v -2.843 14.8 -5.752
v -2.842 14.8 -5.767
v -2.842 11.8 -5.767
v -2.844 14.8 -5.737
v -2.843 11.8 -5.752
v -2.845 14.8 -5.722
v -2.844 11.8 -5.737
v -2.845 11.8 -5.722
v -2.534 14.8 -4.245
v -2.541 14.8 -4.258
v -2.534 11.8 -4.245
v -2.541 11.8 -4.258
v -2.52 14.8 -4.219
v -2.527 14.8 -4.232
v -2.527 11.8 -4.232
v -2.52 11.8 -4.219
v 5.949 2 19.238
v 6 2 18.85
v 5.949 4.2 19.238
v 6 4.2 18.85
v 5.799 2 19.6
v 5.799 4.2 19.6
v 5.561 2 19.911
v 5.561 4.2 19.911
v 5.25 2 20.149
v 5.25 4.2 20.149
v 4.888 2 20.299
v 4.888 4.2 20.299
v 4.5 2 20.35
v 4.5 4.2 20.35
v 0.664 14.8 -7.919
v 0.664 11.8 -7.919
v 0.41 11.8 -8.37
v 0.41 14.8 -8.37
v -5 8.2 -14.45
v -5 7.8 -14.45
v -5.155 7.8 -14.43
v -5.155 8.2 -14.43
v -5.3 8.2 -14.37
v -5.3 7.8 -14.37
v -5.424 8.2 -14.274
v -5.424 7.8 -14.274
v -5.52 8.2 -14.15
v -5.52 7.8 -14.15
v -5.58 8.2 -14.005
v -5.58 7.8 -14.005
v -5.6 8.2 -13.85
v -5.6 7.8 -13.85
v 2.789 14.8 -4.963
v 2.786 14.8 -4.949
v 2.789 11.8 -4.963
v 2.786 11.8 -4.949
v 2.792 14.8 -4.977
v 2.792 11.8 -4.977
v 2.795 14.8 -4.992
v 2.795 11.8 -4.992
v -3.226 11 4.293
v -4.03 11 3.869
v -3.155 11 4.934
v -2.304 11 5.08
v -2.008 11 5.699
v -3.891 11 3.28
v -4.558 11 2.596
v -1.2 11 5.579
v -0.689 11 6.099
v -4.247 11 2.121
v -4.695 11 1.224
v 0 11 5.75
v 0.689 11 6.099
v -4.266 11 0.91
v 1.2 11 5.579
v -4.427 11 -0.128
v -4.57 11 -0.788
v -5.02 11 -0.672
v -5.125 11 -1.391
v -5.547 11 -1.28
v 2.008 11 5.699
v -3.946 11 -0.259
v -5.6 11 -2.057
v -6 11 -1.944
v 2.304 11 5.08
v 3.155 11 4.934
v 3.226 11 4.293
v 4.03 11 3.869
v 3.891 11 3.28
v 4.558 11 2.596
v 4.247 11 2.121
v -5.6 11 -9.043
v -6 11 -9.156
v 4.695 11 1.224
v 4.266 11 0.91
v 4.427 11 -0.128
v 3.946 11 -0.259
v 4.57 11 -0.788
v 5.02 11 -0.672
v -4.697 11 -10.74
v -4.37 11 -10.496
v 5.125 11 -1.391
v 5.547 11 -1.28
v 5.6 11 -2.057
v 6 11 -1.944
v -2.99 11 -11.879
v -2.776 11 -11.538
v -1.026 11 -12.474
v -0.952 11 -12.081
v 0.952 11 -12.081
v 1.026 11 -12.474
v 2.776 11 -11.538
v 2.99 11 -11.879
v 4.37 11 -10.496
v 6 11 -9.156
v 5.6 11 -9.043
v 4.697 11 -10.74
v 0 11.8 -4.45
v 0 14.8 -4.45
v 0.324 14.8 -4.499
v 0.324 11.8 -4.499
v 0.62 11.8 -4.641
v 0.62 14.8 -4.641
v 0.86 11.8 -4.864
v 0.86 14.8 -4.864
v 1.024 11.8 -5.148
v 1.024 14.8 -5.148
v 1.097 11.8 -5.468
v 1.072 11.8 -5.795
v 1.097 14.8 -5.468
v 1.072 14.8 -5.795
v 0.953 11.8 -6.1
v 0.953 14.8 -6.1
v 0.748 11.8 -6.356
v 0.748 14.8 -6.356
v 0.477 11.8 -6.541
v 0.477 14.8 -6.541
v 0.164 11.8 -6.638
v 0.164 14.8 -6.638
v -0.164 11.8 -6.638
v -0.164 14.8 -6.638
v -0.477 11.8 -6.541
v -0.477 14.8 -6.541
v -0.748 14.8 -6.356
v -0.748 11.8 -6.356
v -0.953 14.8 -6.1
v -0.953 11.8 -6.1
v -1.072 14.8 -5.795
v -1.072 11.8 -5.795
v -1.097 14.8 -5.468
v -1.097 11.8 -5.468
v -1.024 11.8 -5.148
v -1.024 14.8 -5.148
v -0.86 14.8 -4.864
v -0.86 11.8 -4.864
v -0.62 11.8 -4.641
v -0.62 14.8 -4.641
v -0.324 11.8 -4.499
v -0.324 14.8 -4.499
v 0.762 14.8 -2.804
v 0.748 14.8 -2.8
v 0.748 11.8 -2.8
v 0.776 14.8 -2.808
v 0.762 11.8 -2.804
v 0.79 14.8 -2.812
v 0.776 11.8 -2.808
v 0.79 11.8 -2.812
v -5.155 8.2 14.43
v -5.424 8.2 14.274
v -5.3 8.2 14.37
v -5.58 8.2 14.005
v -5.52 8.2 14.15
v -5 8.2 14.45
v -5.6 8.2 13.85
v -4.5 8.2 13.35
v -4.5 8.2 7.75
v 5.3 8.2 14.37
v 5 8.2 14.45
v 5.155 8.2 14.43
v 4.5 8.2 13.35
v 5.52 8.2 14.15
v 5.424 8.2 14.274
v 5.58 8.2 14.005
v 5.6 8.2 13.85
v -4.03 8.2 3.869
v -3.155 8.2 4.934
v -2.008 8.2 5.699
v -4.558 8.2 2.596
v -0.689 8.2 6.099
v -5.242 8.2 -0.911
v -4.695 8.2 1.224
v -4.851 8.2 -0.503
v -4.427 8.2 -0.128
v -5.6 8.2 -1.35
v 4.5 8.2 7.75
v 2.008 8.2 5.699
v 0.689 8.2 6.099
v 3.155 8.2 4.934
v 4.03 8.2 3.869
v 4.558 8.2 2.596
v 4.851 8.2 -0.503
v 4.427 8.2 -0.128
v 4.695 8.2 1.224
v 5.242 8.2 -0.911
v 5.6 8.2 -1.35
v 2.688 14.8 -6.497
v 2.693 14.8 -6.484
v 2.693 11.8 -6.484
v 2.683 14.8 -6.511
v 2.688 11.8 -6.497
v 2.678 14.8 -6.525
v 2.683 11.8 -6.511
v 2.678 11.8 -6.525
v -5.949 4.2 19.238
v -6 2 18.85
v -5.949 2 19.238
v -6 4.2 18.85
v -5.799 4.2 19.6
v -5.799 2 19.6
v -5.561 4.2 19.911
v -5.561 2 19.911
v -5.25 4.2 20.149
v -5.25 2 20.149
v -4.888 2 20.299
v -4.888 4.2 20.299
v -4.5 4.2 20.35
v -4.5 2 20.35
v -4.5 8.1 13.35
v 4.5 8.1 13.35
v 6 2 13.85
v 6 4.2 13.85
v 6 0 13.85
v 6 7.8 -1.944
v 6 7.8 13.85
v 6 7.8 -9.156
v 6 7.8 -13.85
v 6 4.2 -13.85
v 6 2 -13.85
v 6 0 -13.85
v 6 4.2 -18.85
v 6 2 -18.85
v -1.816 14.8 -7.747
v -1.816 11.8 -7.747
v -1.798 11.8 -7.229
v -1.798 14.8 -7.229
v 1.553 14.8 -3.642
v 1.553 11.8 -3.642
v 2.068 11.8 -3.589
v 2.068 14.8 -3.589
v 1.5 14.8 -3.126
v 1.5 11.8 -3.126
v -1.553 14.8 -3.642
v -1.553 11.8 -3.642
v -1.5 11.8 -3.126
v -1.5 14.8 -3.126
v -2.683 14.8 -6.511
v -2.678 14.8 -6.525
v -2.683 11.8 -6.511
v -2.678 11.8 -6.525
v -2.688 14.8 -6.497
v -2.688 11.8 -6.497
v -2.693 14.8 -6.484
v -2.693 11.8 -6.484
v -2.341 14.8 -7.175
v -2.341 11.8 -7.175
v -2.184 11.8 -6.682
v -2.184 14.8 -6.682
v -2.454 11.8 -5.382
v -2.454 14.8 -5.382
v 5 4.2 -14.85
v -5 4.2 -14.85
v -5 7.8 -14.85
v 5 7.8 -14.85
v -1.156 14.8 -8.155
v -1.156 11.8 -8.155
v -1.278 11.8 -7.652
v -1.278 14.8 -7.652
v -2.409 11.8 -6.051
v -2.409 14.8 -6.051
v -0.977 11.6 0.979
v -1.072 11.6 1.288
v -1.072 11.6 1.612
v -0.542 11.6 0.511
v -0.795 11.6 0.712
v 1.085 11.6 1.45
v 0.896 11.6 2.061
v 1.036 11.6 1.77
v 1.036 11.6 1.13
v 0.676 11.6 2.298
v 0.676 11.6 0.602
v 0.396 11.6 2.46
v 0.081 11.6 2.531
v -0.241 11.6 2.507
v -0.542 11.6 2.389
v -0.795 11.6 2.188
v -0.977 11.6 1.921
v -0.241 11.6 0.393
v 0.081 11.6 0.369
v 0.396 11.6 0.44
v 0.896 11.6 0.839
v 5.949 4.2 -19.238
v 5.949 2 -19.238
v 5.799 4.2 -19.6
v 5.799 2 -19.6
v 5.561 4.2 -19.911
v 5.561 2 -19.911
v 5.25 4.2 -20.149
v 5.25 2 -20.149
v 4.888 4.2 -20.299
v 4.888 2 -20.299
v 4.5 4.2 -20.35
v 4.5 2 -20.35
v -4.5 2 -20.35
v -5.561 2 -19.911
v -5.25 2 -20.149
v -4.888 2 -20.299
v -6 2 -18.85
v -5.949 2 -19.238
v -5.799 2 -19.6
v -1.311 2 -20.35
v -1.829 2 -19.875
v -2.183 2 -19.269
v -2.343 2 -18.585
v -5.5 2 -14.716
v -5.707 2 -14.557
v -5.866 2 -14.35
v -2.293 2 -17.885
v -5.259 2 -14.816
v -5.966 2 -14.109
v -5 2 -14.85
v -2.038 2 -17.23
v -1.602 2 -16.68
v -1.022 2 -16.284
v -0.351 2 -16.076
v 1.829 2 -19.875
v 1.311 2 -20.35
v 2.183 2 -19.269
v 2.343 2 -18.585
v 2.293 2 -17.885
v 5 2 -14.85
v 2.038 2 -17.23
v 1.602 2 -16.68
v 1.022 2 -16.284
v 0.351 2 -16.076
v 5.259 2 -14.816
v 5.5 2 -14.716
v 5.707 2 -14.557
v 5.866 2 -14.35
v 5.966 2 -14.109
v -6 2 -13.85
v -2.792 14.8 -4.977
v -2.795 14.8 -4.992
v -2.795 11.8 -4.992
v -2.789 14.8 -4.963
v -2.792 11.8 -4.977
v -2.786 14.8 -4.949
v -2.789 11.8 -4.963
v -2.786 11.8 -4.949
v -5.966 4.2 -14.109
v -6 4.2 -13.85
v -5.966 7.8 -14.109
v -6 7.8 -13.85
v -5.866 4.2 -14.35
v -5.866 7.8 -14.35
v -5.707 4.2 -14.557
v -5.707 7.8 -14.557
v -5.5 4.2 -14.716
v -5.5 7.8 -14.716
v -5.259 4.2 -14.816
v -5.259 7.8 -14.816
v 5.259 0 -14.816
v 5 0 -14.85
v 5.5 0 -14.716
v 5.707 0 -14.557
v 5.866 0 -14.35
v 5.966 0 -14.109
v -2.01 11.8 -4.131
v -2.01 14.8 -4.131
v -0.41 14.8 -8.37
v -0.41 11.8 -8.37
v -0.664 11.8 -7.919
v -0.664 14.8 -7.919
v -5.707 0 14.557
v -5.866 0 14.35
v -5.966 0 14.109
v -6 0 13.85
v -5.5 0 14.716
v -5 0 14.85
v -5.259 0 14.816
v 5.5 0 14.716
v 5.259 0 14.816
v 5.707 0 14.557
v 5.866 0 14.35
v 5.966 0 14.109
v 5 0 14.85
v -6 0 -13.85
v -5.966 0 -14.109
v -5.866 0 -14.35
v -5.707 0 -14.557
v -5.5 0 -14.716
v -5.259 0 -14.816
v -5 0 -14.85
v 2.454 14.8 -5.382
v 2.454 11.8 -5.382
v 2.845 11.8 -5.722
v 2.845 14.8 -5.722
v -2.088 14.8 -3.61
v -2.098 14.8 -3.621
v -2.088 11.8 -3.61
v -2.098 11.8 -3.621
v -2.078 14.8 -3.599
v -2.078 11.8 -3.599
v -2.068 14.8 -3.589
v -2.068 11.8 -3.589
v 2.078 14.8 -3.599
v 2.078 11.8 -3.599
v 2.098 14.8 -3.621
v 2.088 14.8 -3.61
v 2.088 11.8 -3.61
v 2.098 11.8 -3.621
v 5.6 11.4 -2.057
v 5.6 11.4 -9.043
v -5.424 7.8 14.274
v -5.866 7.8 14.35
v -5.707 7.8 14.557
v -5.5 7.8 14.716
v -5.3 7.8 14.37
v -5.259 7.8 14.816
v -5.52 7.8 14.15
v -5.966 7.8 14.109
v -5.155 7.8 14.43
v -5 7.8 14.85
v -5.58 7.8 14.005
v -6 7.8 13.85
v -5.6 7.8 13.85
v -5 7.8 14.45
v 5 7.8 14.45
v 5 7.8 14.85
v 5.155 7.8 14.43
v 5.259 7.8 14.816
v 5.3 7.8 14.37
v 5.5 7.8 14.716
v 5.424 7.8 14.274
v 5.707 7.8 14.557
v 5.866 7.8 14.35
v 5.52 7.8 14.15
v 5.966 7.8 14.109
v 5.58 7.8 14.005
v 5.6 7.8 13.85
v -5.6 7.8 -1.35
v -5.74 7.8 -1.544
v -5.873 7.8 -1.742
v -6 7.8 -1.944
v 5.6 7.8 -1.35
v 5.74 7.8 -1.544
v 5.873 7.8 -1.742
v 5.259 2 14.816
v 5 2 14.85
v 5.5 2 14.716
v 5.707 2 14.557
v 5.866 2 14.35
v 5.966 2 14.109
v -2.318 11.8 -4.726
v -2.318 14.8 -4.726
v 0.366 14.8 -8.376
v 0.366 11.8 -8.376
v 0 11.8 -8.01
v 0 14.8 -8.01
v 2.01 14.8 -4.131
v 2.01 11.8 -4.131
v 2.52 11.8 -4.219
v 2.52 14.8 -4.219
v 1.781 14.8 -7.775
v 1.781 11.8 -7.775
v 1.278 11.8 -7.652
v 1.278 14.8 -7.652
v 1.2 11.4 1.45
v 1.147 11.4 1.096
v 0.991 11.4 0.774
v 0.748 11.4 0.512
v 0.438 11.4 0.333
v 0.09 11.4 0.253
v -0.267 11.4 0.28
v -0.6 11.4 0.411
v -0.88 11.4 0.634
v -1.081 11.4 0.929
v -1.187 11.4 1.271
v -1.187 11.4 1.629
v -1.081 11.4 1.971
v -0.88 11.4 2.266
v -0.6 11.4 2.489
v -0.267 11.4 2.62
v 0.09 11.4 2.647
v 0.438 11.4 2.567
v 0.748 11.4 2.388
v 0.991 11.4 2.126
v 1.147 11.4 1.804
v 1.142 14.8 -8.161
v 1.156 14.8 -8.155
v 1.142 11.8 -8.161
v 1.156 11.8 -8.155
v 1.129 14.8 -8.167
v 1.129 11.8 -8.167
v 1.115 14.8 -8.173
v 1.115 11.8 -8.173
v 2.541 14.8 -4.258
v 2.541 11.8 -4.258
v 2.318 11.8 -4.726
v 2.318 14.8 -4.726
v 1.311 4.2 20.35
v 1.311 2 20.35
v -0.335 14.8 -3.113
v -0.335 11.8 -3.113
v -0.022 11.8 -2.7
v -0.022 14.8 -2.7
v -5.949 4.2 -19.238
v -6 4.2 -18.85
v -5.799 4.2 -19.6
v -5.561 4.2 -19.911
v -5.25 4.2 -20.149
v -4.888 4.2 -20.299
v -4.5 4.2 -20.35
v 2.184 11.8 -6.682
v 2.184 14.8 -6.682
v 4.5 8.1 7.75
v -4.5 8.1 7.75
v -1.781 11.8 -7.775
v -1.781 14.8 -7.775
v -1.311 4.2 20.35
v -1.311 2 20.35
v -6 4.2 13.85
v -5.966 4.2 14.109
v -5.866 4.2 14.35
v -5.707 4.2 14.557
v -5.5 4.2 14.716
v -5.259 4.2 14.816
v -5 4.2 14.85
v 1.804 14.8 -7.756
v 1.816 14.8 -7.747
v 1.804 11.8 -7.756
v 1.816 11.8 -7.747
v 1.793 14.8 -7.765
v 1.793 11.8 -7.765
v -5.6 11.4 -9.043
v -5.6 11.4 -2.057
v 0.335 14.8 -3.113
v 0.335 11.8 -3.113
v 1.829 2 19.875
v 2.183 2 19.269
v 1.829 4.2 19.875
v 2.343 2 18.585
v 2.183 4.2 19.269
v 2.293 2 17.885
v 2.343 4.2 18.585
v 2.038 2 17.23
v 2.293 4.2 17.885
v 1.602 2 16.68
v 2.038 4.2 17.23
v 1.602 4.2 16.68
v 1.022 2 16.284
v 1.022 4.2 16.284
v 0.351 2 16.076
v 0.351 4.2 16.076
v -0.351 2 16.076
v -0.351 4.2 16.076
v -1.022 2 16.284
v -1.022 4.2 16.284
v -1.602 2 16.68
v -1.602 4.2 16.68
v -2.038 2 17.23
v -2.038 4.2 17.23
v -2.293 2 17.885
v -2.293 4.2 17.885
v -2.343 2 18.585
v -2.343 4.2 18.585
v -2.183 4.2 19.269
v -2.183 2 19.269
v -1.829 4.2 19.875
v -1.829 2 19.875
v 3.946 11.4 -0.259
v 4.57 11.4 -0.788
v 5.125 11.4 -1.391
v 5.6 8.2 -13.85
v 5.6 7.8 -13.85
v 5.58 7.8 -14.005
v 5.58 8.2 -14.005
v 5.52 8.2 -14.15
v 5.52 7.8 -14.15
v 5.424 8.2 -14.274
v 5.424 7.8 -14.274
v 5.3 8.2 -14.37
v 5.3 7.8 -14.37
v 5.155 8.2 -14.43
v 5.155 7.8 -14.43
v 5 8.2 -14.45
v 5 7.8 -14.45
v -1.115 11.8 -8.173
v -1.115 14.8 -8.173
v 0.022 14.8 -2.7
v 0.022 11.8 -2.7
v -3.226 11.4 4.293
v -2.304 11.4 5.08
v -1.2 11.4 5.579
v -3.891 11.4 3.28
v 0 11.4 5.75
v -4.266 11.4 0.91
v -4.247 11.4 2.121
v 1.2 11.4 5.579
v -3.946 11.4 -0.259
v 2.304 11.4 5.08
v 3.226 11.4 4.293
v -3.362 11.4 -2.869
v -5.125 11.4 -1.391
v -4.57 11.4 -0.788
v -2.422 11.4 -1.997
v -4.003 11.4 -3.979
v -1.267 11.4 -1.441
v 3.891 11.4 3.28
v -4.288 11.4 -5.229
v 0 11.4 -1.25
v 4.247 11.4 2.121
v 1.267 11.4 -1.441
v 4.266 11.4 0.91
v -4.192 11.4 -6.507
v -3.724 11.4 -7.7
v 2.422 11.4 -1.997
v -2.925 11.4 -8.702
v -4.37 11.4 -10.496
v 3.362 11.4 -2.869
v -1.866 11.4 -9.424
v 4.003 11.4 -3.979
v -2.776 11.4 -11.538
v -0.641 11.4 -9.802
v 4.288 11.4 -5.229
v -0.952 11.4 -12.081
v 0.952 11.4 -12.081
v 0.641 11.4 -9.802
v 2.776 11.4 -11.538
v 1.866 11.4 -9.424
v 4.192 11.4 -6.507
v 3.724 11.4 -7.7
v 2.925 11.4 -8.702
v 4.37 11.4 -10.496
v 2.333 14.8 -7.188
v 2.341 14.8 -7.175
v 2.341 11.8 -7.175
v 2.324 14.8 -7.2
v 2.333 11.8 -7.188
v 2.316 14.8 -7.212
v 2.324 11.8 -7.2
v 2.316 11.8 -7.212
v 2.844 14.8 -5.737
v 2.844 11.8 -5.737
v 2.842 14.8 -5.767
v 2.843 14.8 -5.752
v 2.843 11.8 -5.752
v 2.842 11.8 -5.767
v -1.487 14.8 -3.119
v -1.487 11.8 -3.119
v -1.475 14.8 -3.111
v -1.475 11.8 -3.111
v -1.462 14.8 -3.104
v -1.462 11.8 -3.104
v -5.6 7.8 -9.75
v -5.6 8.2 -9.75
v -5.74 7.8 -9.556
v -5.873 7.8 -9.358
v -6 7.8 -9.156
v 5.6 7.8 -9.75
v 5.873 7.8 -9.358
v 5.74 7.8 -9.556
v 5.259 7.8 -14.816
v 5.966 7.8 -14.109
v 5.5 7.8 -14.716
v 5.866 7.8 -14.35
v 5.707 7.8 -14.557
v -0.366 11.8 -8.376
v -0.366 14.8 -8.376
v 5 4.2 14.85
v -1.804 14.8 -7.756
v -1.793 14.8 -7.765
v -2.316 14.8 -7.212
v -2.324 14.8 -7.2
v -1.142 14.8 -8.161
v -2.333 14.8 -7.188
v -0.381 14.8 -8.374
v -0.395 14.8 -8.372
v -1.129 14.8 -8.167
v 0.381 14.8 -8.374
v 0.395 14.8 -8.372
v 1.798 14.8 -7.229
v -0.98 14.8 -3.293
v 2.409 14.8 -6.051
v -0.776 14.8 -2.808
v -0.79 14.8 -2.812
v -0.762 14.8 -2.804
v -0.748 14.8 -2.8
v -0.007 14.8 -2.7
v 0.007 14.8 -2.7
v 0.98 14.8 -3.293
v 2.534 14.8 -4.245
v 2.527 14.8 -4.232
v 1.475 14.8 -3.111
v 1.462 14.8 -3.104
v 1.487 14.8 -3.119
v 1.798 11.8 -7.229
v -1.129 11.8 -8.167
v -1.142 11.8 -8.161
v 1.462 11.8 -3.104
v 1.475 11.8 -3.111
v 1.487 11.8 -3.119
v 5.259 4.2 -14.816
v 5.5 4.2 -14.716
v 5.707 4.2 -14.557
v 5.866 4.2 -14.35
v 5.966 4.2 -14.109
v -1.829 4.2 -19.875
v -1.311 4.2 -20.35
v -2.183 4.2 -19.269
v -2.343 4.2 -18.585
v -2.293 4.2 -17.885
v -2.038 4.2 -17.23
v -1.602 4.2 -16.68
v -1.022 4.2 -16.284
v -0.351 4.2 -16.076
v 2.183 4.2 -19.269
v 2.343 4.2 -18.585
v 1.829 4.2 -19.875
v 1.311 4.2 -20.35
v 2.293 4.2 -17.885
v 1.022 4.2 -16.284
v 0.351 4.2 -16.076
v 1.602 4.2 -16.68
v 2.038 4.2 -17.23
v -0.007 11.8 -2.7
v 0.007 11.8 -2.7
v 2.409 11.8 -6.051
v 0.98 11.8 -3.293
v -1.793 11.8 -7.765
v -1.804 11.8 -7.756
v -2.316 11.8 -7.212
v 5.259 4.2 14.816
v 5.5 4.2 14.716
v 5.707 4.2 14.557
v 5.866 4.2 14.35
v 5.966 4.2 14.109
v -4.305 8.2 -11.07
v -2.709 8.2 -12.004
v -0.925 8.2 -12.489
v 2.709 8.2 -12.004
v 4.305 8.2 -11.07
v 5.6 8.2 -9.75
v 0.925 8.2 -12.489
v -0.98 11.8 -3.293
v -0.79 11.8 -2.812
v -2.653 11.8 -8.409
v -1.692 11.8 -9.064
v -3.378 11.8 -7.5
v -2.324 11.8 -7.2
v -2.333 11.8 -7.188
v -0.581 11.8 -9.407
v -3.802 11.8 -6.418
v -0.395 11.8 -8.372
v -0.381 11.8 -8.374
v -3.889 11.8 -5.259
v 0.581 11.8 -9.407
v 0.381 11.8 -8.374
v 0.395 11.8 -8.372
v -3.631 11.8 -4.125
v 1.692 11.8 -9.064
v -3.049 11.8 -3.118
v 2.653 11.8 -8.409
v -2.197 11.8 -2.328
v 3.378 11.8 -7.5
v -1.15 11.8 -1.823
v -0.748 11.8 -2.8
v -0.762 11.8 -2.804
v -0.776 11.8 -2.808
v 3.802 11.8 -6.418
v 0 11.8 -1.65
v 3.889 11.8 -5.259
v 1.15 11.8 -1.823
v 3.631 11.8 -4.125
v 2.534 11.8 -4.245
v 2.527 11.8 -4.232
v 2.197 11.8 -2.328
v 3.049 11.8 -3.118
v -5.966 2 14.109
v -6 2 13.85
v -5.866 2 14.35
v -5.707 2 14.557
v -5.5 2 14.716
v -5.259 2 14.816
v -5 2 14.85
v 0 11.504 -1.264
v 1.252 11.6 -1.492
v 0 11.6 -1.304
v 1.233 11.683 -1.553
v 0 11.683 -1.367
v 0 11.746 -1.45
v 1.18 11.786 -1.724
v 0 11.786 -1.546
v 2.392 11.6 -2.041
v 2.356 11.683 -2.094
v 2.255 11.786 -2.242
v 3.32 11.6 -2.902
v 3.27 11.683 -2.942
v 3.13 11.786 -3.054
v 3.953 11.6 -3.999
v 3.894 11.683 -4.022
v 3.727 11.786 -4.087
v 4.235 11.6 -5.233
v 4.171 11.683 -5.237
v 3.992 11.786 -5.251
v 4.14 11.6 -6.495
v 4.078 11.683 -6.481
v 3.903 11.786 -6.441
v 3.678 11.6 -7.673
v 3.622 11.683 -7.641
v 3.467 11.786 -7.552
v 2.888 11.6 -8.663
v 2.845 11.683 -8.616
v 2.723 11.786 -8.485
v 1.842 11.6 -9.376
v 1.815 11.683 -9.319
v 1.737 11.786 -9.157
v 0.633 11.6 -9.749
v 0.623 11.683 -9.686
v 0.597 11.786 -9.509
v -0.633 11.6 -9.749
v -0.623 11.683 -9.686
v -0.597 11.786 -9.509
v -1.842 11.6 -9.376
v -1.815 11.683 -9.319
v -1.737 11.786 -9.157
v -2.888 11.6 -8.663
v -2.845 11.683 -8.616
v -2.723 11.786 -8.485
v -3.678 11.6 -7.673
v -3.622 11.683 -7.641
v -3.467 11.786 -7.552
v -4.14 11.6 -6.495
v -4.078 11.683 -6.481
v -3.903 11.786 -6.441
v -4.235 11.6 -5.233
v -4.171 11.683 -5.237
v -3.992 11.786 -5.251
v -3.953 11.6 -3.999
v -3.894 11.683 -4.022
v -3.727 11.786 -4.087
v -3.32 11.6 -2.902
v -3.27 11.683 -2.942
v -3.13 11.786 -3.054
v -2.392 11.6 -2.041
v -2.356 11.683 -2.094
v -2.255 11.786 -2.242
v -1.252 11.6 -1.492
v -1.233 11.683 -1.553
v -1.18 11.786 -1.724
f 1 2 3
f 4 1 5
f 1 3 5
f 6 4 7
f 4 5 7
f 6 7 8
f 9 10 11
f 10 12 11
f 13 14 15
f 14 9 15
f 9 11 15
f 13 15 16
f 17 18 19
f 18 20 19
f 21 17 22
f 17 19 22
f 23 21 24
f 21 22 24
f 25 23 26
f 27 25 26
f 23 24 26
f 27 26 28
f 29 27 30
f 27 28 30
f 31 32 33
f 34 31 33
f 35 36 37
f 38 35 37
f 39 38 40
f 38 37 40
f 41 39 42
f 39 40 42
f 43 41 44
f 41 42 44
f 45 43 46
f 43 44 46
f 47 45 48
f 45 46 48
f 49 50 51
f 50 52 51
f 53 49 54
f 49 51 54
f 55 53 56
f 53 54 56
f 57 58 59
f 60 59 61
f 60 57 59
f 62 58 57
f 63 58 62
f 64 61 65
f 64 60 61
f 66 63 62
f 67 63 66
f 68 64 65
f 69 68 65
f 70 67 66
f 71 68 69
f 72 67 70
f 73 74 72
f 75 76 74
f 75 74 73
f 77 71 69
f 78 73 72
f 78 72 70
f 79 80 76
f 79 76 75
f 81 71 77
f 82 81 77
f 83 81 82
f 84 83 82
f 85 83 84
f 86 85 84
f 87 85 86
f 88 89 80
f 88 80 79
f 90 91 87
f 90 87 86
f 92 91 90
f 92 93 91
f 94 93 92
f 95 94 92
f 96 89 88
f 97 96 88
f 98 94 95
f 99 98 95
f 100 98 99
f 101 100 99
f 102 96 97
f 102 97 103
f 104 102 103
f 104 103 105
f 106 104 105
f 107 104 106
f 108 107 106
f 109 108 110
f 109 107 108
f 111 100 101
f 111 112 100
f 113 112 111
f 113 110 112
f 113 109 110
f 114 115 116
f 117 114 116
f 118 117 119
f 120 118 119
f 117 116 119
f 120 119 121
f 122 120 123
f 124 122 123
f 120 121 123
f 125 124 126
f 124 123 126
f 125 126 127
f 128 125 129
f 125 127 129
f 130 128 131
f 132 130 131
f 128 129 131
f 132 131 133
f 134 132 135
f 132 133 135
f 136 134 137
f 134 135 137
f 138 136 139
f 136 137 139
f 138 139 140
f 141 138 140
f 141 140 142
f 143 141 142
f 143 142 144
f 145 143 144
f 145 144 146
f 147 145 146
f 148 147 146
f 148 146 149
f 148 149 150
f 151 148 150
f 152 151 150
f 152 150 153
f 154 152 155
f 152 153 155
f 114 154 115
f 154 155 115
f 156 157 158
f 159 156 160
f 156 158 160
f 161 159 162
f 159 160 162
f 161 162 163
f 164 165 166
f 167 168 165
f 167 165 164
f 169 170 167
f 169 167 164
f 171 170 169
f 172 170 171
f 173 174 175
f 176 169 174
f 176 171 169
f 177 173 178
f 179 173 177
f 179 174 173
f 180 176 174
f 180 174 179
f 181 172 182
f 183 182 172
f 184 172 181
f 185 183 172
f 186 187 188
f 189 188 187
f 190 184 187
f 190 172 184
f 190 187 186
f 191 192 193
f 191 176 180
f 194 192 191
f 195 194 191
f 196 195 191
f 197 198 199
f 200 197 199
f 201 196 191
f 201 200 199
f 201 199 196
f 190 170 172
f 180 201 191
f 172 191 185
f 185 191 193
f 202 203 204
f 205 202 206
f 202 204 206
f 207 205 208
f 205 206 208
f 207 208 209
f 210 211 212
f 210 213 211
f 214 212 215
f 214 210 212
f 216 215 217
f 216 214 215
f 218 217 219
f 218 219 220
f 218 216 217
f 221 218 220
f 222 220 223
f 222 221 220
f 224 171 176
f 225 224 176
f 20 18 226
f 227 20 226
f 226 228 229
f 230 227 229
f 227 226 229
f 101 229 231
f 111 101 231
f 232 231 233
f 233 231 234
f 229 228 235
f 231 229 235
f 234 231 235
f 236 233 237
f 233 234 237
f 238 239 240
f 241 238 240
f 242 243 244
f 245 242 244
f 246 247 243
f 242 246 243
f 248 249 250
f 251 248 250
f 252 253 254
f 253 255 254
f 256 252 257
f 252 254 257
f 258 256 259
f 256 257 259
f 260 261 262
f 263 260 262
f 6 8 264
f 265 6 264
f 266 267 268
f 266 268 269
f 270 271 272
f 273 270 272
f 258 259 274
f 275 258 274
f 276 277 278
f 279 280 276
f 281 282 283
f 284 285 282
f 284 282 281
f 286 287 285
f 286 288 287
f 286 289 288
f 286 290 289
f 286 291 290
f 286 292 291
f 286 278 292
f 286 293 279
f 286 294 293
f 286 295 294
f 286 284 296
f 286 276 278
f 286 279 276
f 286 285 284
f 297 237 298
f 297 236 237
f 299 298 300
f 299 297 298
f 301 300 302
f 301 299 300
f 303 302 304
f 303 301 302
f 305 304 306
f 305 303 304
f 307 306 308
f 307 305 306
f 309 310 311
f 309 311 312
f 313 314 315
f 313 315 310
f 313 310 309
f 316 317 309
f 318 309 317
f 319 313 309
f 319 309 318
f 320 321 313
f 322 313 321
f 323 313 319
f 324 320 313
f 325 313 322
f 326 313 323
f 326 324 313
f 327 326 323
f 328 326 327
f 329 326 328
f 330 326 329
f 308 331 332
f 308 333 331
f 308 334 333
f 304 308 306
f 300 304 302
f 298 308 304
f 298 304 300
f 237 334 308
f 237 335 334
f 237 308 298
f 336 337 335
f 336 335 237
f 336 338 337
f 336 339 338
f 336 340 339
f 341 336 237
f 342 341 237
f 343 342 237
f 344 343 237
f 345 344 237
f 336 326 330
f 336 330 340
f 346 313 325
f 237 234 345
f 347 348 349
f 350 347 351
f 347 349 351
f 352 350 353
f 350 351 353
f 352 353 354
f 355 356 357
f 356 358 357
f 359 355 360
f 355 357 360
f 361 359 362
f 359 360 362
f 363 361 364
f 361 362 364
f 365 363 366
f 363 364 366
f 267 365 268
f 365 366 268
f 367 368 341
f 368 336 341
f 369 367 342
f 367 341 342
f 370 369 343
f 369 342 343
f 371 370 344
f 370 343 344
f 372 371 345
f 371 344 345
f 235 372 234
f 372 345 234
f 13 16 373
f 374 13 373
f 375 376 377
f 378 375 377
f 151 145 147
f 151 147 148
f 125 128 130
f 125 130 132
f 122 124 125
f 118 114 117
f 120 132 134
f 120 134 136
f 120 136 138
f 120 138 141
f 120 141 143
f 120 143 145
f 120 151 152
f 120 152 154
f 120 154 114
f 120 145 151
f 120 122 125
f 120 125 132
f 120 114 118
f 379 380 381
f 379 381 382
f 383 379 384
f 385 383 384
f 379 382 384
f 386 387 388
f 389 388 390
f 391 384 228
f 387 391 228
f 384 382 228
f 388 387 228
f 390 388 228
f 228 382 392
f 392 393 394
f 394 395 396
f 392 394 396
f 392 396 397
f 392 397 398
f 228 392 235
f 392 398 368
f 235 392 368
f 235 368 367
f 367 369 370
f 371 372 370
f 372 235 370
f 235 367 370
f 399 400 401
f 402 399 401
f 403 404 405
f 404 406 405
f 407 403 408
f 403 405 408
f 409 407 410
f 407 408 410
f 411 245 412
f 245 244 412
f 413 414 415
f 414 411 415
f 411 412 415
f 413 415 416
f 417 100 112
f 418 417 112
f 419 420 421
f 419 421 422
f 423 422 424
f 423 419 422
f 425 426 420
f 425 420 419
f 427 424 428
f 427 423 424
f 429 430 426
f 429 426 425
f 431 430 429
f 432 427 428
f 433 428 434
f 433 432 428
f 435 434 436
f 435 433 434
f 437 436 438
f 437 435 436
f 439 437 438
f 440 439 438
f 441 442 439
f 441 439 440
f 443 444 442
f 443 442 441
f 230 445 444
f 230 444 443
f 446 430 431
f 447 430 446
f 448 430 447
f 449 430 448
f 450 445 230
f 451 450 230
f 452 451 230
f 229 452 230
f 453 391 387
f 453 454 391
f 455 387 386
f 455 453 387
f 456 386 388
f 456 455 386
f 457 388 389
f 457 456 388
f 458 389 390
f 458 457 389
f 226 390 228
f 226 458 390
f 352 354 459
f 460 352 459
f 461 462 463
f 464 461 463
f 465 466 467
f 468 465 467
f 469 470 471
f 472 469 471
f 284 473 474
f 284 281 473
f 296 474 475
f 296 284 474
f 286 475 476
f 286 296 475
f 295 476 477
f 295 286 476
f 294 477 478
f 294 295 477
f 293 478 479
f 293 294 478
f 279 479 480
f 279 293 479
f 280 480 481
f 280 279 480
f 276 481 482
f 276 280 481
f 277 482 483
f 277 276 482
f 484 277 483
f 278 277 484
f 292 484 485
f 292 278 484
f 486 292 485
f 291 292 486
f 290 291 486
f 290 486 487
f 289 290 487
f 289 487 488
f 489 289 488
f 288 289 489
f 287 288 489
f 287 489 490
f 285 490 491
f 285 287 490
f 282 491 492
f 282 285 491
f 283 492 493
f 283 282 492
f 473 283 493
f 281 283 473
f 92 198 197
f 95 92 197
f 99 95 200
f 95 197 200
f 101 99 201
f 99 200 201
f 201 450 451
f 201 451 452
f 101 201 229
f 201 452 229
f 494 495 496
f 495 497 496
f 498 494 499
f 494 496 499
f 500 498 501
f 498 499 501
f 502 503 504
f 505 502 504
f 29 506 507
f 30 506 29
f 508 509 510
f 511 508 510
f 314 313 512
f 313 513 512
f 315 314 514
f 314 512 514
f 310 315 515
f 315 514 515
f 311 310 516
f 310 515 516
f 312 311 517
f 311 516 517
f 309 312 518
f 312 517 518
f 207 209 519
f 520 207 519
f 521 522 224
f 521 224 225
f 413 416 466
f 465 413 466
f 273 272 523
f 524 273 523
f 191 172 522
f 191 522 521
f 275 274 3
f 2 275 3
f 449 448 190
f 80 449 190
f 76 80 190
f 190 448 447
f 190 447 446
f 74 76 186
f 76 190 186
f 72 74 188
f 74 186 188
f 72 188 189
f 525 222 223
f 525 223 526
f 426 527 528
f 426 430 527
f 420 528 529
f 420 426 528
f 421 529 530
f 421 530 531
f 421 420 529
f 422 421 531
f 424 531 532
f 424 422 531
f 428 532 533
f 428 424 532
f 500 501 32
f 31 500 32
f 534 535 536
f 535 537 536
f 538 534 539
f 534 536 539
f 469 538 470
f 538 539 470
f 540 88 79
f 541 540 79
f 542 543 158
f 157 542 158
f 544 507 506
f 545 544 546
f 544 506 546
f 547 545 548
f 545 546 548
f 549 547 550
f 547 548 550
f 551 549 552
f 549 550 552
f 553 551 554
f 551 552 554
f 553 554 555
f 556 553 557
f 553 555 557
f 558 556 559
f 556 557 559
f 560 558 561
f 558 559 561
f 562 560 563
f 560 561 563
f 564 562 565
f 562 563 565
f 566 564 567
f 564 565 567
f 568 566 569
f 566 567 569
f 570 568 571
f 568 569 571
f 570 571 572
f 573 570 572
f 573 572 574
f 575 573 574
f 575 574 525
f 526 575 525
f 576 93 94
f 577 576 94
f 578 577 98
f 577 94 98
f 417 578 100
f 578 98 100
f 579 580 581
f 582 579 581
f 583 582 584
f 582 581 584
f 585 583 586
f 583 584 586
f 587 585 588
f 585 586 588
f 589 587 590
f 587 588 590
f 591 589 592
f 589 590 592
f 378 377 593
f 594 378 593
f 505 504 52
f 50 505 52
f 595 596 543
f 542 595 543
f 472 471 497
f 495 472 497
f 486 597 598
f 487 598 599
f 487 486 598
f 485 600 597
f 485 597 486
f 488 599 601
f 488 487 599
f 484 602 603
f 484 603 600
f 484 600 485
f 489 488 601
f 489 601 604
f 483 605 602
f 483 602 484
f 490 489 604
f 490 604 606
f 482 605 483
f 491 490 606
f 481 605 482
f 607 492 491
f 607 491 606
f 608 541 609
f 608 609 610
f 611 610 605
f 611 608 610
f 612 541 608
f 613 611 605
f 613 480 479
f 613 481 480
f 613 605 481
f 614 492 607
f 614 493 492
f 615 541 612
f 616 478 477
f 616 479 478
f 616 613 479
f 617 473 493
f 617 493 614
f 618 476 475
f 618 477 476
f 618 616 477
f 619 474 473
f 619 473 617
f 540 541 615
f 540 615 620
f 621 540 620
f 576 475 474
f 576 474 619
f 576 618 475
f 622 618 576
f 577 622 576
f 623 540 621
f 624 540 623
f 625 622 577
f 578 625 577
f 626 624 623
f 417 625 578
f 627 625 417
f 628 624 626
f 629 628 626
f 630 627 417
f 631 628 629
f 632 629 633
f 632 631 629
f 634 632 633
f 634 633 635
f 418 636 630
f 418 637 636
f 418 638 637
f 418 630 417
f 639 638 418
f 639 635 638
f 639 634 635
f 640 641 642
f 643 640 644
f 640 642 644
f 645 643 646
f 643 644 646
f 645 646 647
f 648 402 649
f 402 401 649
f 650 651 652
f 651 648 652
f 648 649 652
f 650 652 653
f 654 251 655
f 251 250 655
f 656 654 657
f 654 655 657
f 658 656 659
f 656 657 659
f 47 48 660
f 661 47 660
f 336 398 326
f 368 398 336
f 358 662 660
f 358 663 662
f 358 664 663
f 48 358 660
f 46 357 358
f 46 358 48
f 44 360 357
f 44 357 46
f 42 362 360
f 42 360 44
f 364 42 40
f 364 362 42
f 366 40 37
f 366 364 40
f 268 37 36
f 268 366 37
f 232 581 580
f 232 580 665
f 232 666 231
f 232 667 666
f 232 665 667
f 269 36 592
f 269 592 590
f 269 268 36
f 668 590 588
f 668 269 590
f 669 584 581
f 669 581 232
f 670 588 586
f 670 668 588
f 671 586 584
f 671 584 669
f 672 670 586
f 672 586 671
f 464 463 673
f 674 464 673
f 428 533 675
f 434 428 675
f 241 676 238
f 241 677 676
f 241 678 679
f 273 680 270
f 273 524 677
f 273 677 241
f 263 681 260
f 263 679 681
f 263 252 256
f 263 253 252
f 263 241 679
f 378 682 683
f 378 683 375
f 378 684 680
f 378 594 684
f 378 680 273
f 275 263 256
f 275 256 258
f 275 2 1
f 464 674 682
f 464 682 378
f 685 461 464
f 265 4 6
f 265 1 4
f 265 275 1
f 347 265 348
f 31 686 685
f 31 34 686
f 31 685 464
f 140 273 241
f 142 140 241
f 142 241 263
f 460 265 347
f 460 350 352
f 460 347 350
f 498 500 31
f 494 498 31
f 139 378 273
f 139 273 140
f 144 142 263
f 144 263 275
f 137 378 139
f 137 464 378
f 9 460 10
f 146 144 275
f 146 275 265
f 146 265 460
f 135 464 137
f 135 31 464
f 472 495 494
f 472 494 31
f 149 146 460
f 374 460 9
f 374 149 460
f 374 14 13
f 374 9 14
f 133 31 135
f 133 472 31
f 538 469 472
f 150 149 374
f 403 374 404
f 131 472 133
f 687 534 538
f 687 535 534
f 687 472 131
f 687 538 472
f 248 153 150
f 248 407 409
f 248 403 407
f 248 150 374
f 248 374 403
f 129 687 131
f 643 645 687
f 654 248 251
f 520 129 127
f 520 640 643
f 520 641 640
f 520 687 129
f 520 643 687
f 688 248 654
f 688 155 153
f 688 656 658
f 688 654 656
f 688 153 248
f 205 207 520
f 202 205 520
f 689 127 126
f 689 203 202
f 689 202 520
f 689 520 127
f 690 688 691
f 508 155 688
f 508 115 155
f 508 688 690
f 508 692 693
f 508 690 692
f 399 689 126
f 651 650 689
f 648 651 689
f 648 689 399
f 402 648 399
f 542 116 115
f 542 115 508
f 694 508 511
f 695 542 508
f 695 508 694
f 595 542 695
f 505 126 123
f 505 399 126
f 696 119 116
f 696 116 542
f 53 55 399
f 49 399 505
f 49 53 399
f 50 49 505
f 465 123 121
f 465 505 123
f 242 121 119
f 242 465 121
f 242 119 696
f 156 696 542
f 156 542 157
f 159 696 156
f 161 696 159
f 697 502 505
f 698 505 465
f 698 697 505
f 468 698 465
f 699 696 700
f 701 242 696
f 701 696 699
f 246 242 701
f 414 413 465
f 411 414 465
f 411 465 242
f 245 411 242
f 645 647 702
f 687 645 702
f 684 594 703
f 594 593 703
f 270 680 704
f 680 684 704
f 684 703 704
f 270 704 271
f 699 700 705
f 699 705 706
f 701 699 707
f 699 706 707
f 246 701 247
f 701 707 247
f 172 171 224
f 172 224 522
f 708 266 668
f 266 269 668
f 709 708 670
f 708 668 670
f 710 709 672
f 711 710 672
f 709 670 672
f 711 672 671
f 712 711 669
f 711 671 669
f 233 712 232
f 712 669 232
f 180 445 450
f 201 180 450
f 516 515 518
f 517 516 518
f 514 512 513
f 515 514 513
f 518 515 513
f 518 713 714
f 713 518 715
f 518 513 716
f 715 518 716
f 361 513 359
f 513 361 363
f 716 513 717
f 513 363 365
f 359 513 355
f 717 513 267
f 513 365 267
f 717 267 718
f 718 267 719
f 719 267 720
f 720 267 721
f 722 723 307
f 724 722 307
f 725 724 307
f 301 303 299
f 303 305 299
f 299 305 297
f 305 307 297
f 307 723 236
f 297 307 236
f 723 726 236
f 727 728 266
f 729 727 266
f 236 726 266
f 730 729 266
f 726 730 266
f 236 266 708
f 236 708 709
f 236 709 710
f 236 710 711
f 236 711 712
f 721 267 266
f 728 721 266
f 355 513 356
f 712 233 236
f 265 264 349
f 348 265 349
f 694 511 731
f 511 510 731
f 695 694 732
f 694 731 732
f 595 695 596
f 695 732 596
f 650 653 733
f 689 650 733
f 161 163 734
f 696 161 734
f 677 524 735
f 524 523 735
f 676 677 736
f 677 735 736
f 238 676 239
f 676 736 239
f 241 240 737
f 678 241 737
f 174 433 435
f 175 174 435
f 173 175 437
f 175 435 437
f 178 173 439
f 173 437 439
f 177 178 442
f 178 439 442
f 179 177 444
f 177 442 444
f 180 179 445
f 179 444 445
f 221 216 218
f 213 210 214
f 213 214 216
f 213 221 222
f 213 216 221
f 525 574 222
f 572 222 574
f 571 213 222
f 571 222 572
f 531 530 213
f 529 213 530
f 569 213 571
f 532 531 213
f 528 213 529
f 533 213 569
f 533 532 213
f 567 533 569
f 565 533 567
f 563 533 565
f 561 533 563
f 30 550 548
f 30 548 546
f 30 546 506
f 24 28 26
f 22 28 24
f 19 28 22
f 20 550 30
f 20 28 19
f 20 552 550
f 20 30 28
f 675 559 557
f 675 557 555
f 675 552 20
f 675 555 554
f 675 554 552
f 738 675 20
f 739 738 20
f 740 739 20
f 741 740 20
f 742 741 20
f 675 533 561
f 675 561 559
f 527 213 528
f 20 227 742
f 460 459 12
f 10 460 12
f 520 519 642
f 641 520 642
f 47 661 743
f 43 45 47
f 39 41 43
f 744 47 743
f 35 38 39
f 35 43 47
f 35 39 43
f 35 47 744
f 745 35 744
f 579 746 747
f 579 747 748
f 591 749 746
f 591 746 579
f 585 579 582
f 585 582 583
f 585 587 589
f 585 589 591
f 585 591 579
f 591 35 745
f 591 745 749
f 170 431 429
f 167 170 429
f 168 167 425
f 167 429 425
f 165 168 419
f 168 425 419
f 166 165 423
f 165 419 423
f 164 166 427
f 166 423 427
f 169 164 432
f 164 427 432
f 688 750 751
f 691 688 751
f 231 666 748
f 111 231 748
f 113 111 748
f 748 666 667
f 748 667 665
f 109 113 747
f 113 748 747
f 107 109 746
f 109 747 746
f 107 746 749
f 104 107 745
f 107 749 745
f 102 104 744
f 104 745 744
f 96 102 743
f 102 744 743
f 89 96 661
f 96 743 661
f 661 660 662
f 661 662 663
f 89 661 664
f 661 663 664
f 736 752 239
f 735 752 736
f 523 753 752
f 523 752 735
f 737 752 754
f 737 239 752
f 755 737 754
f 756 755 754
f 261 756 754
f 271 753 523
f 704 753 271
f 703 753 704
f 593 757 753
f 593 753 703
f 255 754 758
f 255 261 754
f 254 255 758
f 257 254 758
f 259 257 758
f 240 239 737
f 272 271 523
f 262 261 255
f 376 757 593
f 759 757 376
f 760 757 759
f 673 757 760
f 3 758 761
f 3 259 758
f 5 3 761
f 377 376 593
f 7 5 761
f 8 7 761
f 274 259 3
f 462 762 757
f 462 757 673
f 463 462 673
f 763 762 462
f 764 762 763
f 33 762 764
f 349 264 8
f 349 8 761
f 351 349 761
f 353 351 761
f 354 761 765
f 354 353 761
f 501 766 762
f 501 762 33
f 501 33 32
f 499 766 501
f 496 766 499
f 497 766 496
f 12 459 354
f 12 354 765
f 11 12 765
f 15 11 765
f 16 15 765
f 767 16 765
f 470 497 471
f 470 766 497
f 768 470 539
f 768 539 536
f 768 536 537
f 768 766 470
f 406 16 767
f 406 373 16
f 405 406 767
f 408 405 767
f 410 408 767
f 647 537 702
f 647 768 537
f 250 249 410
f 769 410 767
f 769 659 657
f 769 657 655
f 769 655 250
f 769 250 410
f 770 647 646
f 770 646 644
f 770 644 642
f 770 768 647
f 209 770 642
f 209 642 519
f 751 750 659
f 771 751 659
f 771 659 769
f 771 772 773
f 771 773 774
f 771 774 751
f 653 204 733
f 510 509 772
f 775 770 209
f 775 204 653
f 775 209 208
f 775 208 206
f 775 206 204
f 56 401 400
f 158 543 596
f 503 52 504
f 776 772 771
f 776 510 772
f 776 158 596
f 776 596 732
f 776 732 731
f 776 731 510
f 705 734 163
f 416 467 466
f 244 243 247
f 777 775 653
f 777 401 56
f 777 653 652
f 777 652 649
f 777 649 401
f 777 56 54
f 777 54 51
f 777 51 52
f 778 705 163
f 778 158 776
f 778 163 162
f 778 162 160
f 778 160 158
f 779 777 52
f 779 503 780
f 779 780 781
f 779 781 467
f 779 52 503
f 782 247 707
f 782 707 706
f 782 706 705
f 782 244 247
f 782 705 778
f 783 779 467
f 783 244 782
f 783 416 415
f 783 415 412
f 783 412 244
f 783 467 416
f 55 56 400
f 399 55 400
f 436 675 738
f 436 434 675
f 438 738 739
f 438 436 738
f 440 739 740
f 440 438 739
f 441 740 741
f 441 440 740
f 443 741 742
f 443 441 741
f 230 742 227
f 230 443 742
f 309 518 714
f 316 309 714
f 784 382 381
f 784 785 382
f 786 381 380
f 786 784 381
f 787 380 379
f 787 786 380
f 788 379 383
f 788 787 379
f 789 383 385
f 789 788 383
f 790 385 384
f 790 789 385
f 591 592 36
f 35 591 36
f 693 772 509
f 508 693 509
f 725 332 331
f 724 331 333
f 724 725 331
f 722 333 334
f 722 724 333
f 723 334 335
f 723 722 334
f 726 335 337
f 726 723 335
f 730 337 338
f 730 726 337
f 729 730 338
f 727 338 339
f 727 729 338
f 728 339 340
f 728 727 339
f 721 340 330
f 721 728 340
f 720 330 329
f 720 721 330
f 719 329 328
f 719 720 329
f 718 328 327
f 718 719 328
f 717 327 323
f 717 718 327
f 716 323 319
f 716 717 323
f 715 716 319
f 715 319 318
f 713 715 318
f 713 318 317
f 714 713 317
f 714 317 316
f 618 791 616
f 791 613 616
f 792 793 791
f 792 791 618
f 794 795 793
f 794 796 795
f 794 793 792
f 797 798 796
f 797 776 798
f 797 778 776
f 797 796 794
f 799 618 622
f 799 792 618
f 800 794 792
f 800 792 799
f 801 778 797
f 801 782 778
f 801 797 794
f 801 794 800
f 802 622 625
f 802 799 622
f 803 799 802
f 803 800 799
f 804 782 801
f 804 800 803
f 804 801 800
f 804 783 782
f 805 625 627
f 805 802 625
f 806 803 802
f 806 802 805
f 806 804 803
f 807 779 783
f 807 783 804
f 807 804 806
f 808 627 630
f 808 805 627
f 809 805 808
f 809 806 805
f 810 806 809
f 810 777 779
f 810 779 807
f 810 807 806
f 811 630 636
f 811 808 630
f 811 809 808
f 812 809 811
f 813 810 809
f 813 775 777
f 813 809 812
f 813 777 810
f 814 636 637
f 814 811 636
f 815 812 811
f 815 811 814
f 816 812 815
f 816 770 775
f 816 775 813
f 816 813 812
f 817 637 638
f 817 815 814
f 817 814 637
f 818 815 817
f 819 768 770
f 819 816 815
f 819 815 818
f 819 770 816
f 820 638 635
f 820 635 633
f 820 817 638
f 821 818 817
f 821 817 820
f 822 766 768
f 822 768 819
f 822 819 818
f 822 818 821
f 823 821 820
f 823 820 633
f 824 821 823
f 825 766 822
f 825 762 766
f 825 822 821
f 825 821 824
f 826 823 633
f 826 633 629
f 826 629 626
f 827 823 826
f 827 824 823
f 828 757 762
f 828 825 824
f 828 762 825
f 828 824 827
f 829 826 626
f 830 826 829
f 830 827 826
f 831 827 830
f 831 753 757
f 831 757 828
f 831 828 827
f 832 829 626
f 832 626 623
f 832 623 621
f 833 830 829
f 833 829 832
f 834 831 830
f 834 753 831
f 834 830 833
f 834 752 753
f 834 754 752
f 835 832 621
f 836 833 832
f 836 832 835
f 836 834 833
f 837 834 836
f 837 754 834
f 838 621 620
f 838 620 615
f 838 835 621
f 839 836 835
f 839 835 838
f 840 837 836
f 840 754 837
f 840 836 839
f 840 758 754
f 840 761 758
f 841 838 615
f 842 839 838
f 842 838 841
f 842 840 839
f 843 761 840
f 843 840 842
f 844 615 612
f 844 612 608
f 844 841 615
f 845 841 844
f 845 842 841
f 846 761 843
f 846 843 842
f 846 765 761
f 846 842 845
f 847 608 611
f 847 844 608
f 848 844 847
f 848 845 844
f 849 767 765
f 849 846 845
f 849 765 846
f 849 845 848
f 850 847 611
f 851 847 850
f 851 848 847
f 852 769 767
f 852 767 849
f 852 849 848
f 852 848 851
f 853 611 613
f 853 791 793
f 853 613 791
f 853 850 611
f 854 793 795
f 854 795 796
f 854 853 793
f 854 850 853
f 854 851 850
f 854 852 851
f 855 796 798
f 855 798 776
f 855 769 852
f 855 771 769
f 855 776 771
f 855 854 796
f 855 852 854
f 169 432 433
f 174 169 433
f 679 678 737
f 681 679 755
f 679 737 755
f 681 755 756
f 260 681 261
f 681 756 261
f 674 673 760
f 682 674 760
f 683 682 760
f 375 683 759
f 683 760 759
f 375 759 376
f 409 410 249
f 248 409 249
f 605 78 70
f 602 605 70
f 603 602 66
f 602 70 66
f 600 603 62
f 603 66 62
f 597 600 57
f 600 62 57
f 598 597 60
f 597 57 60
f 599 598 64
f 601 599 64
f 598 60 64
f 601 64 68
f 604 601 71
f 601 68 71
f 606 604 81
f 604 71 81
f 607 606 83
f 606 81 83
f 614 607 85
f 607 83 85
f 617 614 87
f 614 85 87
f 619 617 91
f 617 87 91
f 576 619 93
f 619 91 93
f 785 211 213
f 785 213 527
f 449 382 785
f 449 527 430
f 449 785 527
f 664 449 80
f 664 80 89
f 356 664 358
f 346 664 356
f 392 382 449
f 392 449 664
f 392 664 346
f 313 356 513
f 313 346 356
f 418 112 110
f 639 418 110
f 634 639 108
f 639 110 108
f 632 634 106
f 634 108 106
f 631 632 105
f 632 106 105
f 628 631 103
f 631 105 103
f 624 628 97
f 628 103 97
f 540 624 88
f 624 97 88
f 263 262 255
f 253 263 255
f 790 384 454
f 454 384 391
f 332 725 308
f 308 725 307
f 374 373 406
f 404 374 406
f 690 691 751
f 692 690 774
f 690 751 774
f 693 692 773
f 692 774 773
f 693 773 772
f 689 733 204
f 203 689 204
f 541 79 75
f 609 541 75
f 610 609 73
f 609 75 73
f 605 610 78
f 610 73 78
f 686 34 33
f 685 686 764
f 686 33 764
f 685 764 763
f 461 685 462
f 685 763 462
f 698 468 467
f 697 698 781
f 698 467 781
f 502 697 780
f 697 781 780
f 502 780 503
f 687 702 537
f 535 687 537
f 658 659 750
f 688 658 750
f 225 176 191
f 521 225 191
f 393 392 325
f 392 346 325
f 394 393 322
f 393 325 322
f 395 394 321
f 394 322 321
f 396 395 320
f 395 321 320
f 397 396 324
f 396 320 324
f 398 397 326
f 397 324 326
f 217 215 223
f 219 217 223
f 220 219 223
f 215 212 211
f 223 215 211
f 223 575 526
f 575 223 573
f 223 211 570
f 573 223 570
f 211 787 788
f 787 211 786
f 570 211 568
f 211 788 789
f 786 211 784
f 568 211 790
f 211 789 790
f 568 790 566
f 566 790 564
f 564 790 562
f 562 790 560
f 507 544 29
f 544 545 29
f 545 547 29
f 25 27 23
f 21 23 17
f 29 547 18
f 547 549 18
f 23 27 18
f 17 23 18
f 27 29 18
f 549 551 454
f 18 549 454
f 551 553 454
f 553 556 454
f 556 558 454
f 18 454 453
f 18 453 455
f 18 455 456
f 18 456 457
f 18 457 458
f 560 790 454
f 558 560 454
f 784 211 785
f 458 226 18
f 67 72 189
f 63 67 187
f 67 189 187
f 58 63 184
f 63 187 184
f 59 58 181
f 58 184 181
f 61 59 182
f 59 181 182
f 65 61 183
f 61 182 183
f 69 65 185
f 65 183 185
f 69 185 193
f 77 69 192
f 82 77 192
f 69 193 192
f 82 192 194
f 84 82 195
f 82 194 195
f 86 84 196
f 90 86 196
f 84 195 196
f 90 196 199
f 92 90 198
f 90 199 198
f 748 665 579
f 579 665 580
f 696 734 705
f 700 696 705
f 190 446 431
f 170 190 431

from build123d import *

# Parameters (mm, degrees)
SKETCH2_W            = 12
SKETCH2_H            = 29.7
BOSS_EXTRUDE1_DEPTH  = 7.8
SKETCH3_W            = 12
SKETCH3_H            = 2.2
BOSS_EXTRUDE2_DEPTH  = 5.5
CUT_EXTRUDE1_REACH   = 23.628
SKETCH4_R            = 2.35
FILLET1_R            = 1.5
FILLET1_OF_MIRROR1_R = 1.5
FILLET2_R            = 1
BOSS_EXTRUDE3_DEPTH  = 3.2
BOSS_EXTRUDE4_DEPTH  = 0.4
BOSS_EXTRUDE7_DEPTH  = 0.4
SKETCH8_R            = 1.2
BOSS_EXTRUDE6_DEPTH  = 0.2
BOSS_EXTRUDE6_TAPER  = 30
SKETCH7_R            = 2.85
BOSS_EXTRUDE5_DEPTH  = 3.4
SKETCH9_W            = 9
SKETCH9_H            = 5.6
CUT_EXTRUDE2_DEPTH   = 0.1
SKETCH10_R           = 1.1
CUT_EXTRUDE3_DEPTH   = 3
SKETCH13_R           = 4.3
BOSS_EXTRUDE8_DEPTH  = 0.4
FILLET3_R            = 0.4
CUT_EXTRUDE4_DEPTH   = 25.276789326
CIRPATTERN1_COUNT    = 23


with BuildPart() as part:
    # Sketch2 → Boss-Extrude1 (new body)
    with BuildSketch(Plane(origin=(0, 0, 0), x_dir=(1, 0, 0), z_dir=(0, 1, 0))):
        Rectangle(SKETCH2_W, SKETCH2_H)
    extrude(amount=BOSS_EXTRUDE1_DEPTH)

    # Sketch3 → Boss-Extrude2 (add)
    with BuildSketch(Plane.XY.offset(14.85)):
        with Locations((0, 3.1)):
            Rectangle(SKETCH3_W, SKETCH3_H)
    boss_extrude2 = extrude(amount=BOSS_EXTRUDE2_DEPTH)

    # Sketch4 → Cut-Extrude1 (cut, up to next)
    with BuildSketch(Plane(origin=(0, 4.2, 0), x_dir=(1, 0, 0), z_dir=(0, 1, 0)), mode=Mode.PRIVATE) as cut_extrude1_sk1:
        with Locations((0, -18.4)):
            Circle(SKETCH4_R)
    cut_extrude1_tool1 = extrude(cut_extrude1_sk1.sketch, amount=-CUT_EXTRUDE1_REACH, mode=Mode.PRIVATE) & part.part
    cut_extrude1 = cut_extrude1_tool1.solids().sort_by_distance((0, 4.2, 18.4))[0]
    add(cut_extrude1, mode=Mode.SUBTRACT)

    # Fillet1
    fillet1_edges = [part.edges().sort_by_distance(p)[0] for p in [
        (6, 3.1, 20.35),
        (-6, 3.1, 20.35),
    ]]
    fillet(fillet1_edges, radius=FILLET1_R)

    # Mirror1: Boss-Extrude2, Cut-Extrude1 across plane
    add(boss_extrude2.mirror(Plane.XY))
    add(cut_extrude1.mirror(Plane.XY), mode=Mode.SUBTRACT)

    # Fillet1 of Mirror1
    fillet1_of_mirror1_edges = [part.edges().sort_by_distance(p)[0] for p in [
        (6, 3.1, -20.35),
        (-6, 3.1, -20.35),
    ]]
    fillet(fillet1_of_mirror1_edges, radius=FILLET1_OF_MIRROR1_R)

    # Fillet2
    fillet2_edges = [part.edges().sort_by_distance(p)[0] for p in [
        (6, 1, 14.85),
        (6, 6, 14.85),
        (-6, 1, 14.85),
        (-6, 6, 14.85),
        (6, 1, -14.85),
        (6, 6, -14.85),
        (-6, 6, -14.85),
        (-6, 1, -14.85),
    ]]
    fillet(fillet2_edges, radius=FILLET2_R)

    # Sketch5 → Boss-Extrude3 (add)
    with BuildSketch(Plane(origin=(0, 7.8, 0), x_dir=(1, 0, 0), z_dir=(0, 1, 0))):
        with BuildLine():
            Line((-6, 9.155551275), (-6, 1.944448725))
            ThreePointArc((-6, 1.944448725), (-5.292143556, 0.968164496), (-4.427230154, 0.127857143))
            ThreePointArc((-4.427230154, 0.127857143), (0, -6.15), (4.427230154, 0.127857143))
            ThreePointArc((4.427230154, 0.127857143), (5.292143556, 0.968164496), (6, 1.944448725))
            Line((6, 1.944448725), (6, 9.155551275))
            ThreePointArc((6, 9.155551275), (0, 12.55), (-6, 9.155551275))
        make_face()
    extrude(amount=BOSS_EXTRUDE3_DEPTH)

    # Sketch6 → Boss-Extrude4 (add)
    with BuildSketch(Plane(origin=(0, 11, 0), x_dir=(1, 0, 0), z_dir=(0, 1, 0))):
        with BuildLine():
            Line((5.6, 2.057150161), (5.6, 9.042849839))
            ThreePointArc((5.6, 9.042849839), (0, 12.15), (-5.6, 9.042849839))
            Line((-5.6, 9.042849839), (-5.6, 2.057150161))
            ThreePointArc((-5.6, 2.057150161), (-4.856753194, 1.081001408), (-3.945673877, 0.259285714))
            ThreePointArc((-3.945673877, 0.259285714), (0, -5.75), (3.945673877, 0.259285714))
            ThreePointArc((3.945673877, 0.259285714), (4.856753194, 1.081001408), (5.6, 2.057150161))
        make_face()
    extrude(amount=BOSS_EXTRUDE4_DEPTH)

    # Sketch11 → Boss-Extrude7 (add)
    with BuildSketch(Plane(origin=(0, 7.8, 0), x_dir=(1, 0, 0), z_dir=(0, 1, 0))):
        with BuildLine():
            Line((-5.6, 13.85), (-5.6, -13.85))
            ThreePointArc((-5.6, -13.85), (-5.424264069, -14.274264069), (-5, -14.45))
            Line((-5, -14.45), (5, -14.45))
            ThreePointArc((5, -14.45), (5.424264069, -14.274264069), (5.6, -13.85))
            Line((5.6, -13.85), (5.6, 13.85))
            ThreePointArc((5.6, 13.85), (5.424264069, 14.274264069), (5, 14.45))
            Line((5, 14.45), (-5, 14.45))
            ThreePointArc((-5, 14.45), (-5.424264069, 14.274264069), (-5.6, 13.85))
        make_face()
    extrude(amount=BOSS_EXTRUDE7_DEPTH)

    # Sketch8 → Boss-Extrude6 (add)
    with BuildSketch(Plane(origin=(0, 11.4, 0), x_dir=(1, 0, 0), z_dir=(0, 1, 0))):
        with Locations((0, -1.45)):
            Circle(SKETCH8_R)
    extrude(amount=BOSS_EXTRUDE6_DEPTH, taper=BOSS_EXTRUDE6_TAPER)

    # Sketch7 → Boss-Extrude5 (add)
    with BuildSketch(Plane(origin=(0, 11.4, 0), x_dir=(1, 0, 0), z_dir=(0, 1, 0))):
        with Locations(Location((0, 5.55, 0), (0, 0, 270))):
            Circle(SKETCH7_R)
    extrude(amount=BOSS_EXTRUDE5_DEPTH)

    # Sketch9 → Cut-Extrude2 (cut)
    with BuildSketch(Plane(origin=(0, 8.2, 0), x_dir=(1, 0, 0), z_dir=(0, 1, 0))):
        with Locations((0, -10.55)):
            Rectangle(SKETCH9_W, SKETCH9_H)
    extrude(amount=-CUT_EXTRUDE2_DEPTH, mode=Mode.SUBTRACT)

    # Sketch10 → Cut-Extrude3 (cut)
    with BuildSketch(Plane(origin=(0, 14.8, 0), x_dir=(1, 0, 0), z_dir=(0, 1, 0))):
        with Locations(Location((0, 5.55, 0), (0, 0, 270))):
            Circle(SKETCH10_R)
    extrude(amount=-CUT_EXTRUDE3_DEPTH, mode=Mode.SUBTRACT)

    # Sketch13 → Boss-Extrude8 (add)
    with BuildSketch(Plane(origin=(0, 11.4, 0), x_dir=(1, 0, 0), z_dir=(0, 1, 0))):
        with Locations(Location((0, 5.55, 0), (0, 0, 270))):
            Circle(SKETCH13_R)
    extrude(amount=BOSS_EXTRUDE8_DEPTH)

    # Fillet3
    fillet3_edges = [part.edges().sort_by_distance(p)[0] for p in [
        (0, 11.8, -9.85),
    ]]
    fillet(fillet3_edges, radius=FILLET3_R - 0.0001)  # a hair under: the kernel refuses the full size

    # Sketch12 → Cut-Extrude4 (cut, through all)
    with BuildSketch(Plane(origin=(0, 11.8, 0), x_dir=(1, 0, 0), z_dir=(0, 1, 0))):
        Polygon((0, 8.010177118), (-0.466249863, 8.476426981), (0.466249863, 8.476426981), align=None)
    cut_extrude4 = extrude(amount=CUT_EXTRUDE4_DEPTH, mode=Mode.SUBTRACT)

    # CirPattern1: Cut-Extrude4 ×23 about axis
    cirpattern1_axis = Axis((0, 0, -5.55), (0, 1, 0))
    for i in range(1, CIRPATTERN1_COUNT):
        add(cut_extrude4.rotate(cirpattern1_axis, i * 360 / CIRPATTERN1_COUNT), mode=Mode.SUBTRACT)


solid = part.part
